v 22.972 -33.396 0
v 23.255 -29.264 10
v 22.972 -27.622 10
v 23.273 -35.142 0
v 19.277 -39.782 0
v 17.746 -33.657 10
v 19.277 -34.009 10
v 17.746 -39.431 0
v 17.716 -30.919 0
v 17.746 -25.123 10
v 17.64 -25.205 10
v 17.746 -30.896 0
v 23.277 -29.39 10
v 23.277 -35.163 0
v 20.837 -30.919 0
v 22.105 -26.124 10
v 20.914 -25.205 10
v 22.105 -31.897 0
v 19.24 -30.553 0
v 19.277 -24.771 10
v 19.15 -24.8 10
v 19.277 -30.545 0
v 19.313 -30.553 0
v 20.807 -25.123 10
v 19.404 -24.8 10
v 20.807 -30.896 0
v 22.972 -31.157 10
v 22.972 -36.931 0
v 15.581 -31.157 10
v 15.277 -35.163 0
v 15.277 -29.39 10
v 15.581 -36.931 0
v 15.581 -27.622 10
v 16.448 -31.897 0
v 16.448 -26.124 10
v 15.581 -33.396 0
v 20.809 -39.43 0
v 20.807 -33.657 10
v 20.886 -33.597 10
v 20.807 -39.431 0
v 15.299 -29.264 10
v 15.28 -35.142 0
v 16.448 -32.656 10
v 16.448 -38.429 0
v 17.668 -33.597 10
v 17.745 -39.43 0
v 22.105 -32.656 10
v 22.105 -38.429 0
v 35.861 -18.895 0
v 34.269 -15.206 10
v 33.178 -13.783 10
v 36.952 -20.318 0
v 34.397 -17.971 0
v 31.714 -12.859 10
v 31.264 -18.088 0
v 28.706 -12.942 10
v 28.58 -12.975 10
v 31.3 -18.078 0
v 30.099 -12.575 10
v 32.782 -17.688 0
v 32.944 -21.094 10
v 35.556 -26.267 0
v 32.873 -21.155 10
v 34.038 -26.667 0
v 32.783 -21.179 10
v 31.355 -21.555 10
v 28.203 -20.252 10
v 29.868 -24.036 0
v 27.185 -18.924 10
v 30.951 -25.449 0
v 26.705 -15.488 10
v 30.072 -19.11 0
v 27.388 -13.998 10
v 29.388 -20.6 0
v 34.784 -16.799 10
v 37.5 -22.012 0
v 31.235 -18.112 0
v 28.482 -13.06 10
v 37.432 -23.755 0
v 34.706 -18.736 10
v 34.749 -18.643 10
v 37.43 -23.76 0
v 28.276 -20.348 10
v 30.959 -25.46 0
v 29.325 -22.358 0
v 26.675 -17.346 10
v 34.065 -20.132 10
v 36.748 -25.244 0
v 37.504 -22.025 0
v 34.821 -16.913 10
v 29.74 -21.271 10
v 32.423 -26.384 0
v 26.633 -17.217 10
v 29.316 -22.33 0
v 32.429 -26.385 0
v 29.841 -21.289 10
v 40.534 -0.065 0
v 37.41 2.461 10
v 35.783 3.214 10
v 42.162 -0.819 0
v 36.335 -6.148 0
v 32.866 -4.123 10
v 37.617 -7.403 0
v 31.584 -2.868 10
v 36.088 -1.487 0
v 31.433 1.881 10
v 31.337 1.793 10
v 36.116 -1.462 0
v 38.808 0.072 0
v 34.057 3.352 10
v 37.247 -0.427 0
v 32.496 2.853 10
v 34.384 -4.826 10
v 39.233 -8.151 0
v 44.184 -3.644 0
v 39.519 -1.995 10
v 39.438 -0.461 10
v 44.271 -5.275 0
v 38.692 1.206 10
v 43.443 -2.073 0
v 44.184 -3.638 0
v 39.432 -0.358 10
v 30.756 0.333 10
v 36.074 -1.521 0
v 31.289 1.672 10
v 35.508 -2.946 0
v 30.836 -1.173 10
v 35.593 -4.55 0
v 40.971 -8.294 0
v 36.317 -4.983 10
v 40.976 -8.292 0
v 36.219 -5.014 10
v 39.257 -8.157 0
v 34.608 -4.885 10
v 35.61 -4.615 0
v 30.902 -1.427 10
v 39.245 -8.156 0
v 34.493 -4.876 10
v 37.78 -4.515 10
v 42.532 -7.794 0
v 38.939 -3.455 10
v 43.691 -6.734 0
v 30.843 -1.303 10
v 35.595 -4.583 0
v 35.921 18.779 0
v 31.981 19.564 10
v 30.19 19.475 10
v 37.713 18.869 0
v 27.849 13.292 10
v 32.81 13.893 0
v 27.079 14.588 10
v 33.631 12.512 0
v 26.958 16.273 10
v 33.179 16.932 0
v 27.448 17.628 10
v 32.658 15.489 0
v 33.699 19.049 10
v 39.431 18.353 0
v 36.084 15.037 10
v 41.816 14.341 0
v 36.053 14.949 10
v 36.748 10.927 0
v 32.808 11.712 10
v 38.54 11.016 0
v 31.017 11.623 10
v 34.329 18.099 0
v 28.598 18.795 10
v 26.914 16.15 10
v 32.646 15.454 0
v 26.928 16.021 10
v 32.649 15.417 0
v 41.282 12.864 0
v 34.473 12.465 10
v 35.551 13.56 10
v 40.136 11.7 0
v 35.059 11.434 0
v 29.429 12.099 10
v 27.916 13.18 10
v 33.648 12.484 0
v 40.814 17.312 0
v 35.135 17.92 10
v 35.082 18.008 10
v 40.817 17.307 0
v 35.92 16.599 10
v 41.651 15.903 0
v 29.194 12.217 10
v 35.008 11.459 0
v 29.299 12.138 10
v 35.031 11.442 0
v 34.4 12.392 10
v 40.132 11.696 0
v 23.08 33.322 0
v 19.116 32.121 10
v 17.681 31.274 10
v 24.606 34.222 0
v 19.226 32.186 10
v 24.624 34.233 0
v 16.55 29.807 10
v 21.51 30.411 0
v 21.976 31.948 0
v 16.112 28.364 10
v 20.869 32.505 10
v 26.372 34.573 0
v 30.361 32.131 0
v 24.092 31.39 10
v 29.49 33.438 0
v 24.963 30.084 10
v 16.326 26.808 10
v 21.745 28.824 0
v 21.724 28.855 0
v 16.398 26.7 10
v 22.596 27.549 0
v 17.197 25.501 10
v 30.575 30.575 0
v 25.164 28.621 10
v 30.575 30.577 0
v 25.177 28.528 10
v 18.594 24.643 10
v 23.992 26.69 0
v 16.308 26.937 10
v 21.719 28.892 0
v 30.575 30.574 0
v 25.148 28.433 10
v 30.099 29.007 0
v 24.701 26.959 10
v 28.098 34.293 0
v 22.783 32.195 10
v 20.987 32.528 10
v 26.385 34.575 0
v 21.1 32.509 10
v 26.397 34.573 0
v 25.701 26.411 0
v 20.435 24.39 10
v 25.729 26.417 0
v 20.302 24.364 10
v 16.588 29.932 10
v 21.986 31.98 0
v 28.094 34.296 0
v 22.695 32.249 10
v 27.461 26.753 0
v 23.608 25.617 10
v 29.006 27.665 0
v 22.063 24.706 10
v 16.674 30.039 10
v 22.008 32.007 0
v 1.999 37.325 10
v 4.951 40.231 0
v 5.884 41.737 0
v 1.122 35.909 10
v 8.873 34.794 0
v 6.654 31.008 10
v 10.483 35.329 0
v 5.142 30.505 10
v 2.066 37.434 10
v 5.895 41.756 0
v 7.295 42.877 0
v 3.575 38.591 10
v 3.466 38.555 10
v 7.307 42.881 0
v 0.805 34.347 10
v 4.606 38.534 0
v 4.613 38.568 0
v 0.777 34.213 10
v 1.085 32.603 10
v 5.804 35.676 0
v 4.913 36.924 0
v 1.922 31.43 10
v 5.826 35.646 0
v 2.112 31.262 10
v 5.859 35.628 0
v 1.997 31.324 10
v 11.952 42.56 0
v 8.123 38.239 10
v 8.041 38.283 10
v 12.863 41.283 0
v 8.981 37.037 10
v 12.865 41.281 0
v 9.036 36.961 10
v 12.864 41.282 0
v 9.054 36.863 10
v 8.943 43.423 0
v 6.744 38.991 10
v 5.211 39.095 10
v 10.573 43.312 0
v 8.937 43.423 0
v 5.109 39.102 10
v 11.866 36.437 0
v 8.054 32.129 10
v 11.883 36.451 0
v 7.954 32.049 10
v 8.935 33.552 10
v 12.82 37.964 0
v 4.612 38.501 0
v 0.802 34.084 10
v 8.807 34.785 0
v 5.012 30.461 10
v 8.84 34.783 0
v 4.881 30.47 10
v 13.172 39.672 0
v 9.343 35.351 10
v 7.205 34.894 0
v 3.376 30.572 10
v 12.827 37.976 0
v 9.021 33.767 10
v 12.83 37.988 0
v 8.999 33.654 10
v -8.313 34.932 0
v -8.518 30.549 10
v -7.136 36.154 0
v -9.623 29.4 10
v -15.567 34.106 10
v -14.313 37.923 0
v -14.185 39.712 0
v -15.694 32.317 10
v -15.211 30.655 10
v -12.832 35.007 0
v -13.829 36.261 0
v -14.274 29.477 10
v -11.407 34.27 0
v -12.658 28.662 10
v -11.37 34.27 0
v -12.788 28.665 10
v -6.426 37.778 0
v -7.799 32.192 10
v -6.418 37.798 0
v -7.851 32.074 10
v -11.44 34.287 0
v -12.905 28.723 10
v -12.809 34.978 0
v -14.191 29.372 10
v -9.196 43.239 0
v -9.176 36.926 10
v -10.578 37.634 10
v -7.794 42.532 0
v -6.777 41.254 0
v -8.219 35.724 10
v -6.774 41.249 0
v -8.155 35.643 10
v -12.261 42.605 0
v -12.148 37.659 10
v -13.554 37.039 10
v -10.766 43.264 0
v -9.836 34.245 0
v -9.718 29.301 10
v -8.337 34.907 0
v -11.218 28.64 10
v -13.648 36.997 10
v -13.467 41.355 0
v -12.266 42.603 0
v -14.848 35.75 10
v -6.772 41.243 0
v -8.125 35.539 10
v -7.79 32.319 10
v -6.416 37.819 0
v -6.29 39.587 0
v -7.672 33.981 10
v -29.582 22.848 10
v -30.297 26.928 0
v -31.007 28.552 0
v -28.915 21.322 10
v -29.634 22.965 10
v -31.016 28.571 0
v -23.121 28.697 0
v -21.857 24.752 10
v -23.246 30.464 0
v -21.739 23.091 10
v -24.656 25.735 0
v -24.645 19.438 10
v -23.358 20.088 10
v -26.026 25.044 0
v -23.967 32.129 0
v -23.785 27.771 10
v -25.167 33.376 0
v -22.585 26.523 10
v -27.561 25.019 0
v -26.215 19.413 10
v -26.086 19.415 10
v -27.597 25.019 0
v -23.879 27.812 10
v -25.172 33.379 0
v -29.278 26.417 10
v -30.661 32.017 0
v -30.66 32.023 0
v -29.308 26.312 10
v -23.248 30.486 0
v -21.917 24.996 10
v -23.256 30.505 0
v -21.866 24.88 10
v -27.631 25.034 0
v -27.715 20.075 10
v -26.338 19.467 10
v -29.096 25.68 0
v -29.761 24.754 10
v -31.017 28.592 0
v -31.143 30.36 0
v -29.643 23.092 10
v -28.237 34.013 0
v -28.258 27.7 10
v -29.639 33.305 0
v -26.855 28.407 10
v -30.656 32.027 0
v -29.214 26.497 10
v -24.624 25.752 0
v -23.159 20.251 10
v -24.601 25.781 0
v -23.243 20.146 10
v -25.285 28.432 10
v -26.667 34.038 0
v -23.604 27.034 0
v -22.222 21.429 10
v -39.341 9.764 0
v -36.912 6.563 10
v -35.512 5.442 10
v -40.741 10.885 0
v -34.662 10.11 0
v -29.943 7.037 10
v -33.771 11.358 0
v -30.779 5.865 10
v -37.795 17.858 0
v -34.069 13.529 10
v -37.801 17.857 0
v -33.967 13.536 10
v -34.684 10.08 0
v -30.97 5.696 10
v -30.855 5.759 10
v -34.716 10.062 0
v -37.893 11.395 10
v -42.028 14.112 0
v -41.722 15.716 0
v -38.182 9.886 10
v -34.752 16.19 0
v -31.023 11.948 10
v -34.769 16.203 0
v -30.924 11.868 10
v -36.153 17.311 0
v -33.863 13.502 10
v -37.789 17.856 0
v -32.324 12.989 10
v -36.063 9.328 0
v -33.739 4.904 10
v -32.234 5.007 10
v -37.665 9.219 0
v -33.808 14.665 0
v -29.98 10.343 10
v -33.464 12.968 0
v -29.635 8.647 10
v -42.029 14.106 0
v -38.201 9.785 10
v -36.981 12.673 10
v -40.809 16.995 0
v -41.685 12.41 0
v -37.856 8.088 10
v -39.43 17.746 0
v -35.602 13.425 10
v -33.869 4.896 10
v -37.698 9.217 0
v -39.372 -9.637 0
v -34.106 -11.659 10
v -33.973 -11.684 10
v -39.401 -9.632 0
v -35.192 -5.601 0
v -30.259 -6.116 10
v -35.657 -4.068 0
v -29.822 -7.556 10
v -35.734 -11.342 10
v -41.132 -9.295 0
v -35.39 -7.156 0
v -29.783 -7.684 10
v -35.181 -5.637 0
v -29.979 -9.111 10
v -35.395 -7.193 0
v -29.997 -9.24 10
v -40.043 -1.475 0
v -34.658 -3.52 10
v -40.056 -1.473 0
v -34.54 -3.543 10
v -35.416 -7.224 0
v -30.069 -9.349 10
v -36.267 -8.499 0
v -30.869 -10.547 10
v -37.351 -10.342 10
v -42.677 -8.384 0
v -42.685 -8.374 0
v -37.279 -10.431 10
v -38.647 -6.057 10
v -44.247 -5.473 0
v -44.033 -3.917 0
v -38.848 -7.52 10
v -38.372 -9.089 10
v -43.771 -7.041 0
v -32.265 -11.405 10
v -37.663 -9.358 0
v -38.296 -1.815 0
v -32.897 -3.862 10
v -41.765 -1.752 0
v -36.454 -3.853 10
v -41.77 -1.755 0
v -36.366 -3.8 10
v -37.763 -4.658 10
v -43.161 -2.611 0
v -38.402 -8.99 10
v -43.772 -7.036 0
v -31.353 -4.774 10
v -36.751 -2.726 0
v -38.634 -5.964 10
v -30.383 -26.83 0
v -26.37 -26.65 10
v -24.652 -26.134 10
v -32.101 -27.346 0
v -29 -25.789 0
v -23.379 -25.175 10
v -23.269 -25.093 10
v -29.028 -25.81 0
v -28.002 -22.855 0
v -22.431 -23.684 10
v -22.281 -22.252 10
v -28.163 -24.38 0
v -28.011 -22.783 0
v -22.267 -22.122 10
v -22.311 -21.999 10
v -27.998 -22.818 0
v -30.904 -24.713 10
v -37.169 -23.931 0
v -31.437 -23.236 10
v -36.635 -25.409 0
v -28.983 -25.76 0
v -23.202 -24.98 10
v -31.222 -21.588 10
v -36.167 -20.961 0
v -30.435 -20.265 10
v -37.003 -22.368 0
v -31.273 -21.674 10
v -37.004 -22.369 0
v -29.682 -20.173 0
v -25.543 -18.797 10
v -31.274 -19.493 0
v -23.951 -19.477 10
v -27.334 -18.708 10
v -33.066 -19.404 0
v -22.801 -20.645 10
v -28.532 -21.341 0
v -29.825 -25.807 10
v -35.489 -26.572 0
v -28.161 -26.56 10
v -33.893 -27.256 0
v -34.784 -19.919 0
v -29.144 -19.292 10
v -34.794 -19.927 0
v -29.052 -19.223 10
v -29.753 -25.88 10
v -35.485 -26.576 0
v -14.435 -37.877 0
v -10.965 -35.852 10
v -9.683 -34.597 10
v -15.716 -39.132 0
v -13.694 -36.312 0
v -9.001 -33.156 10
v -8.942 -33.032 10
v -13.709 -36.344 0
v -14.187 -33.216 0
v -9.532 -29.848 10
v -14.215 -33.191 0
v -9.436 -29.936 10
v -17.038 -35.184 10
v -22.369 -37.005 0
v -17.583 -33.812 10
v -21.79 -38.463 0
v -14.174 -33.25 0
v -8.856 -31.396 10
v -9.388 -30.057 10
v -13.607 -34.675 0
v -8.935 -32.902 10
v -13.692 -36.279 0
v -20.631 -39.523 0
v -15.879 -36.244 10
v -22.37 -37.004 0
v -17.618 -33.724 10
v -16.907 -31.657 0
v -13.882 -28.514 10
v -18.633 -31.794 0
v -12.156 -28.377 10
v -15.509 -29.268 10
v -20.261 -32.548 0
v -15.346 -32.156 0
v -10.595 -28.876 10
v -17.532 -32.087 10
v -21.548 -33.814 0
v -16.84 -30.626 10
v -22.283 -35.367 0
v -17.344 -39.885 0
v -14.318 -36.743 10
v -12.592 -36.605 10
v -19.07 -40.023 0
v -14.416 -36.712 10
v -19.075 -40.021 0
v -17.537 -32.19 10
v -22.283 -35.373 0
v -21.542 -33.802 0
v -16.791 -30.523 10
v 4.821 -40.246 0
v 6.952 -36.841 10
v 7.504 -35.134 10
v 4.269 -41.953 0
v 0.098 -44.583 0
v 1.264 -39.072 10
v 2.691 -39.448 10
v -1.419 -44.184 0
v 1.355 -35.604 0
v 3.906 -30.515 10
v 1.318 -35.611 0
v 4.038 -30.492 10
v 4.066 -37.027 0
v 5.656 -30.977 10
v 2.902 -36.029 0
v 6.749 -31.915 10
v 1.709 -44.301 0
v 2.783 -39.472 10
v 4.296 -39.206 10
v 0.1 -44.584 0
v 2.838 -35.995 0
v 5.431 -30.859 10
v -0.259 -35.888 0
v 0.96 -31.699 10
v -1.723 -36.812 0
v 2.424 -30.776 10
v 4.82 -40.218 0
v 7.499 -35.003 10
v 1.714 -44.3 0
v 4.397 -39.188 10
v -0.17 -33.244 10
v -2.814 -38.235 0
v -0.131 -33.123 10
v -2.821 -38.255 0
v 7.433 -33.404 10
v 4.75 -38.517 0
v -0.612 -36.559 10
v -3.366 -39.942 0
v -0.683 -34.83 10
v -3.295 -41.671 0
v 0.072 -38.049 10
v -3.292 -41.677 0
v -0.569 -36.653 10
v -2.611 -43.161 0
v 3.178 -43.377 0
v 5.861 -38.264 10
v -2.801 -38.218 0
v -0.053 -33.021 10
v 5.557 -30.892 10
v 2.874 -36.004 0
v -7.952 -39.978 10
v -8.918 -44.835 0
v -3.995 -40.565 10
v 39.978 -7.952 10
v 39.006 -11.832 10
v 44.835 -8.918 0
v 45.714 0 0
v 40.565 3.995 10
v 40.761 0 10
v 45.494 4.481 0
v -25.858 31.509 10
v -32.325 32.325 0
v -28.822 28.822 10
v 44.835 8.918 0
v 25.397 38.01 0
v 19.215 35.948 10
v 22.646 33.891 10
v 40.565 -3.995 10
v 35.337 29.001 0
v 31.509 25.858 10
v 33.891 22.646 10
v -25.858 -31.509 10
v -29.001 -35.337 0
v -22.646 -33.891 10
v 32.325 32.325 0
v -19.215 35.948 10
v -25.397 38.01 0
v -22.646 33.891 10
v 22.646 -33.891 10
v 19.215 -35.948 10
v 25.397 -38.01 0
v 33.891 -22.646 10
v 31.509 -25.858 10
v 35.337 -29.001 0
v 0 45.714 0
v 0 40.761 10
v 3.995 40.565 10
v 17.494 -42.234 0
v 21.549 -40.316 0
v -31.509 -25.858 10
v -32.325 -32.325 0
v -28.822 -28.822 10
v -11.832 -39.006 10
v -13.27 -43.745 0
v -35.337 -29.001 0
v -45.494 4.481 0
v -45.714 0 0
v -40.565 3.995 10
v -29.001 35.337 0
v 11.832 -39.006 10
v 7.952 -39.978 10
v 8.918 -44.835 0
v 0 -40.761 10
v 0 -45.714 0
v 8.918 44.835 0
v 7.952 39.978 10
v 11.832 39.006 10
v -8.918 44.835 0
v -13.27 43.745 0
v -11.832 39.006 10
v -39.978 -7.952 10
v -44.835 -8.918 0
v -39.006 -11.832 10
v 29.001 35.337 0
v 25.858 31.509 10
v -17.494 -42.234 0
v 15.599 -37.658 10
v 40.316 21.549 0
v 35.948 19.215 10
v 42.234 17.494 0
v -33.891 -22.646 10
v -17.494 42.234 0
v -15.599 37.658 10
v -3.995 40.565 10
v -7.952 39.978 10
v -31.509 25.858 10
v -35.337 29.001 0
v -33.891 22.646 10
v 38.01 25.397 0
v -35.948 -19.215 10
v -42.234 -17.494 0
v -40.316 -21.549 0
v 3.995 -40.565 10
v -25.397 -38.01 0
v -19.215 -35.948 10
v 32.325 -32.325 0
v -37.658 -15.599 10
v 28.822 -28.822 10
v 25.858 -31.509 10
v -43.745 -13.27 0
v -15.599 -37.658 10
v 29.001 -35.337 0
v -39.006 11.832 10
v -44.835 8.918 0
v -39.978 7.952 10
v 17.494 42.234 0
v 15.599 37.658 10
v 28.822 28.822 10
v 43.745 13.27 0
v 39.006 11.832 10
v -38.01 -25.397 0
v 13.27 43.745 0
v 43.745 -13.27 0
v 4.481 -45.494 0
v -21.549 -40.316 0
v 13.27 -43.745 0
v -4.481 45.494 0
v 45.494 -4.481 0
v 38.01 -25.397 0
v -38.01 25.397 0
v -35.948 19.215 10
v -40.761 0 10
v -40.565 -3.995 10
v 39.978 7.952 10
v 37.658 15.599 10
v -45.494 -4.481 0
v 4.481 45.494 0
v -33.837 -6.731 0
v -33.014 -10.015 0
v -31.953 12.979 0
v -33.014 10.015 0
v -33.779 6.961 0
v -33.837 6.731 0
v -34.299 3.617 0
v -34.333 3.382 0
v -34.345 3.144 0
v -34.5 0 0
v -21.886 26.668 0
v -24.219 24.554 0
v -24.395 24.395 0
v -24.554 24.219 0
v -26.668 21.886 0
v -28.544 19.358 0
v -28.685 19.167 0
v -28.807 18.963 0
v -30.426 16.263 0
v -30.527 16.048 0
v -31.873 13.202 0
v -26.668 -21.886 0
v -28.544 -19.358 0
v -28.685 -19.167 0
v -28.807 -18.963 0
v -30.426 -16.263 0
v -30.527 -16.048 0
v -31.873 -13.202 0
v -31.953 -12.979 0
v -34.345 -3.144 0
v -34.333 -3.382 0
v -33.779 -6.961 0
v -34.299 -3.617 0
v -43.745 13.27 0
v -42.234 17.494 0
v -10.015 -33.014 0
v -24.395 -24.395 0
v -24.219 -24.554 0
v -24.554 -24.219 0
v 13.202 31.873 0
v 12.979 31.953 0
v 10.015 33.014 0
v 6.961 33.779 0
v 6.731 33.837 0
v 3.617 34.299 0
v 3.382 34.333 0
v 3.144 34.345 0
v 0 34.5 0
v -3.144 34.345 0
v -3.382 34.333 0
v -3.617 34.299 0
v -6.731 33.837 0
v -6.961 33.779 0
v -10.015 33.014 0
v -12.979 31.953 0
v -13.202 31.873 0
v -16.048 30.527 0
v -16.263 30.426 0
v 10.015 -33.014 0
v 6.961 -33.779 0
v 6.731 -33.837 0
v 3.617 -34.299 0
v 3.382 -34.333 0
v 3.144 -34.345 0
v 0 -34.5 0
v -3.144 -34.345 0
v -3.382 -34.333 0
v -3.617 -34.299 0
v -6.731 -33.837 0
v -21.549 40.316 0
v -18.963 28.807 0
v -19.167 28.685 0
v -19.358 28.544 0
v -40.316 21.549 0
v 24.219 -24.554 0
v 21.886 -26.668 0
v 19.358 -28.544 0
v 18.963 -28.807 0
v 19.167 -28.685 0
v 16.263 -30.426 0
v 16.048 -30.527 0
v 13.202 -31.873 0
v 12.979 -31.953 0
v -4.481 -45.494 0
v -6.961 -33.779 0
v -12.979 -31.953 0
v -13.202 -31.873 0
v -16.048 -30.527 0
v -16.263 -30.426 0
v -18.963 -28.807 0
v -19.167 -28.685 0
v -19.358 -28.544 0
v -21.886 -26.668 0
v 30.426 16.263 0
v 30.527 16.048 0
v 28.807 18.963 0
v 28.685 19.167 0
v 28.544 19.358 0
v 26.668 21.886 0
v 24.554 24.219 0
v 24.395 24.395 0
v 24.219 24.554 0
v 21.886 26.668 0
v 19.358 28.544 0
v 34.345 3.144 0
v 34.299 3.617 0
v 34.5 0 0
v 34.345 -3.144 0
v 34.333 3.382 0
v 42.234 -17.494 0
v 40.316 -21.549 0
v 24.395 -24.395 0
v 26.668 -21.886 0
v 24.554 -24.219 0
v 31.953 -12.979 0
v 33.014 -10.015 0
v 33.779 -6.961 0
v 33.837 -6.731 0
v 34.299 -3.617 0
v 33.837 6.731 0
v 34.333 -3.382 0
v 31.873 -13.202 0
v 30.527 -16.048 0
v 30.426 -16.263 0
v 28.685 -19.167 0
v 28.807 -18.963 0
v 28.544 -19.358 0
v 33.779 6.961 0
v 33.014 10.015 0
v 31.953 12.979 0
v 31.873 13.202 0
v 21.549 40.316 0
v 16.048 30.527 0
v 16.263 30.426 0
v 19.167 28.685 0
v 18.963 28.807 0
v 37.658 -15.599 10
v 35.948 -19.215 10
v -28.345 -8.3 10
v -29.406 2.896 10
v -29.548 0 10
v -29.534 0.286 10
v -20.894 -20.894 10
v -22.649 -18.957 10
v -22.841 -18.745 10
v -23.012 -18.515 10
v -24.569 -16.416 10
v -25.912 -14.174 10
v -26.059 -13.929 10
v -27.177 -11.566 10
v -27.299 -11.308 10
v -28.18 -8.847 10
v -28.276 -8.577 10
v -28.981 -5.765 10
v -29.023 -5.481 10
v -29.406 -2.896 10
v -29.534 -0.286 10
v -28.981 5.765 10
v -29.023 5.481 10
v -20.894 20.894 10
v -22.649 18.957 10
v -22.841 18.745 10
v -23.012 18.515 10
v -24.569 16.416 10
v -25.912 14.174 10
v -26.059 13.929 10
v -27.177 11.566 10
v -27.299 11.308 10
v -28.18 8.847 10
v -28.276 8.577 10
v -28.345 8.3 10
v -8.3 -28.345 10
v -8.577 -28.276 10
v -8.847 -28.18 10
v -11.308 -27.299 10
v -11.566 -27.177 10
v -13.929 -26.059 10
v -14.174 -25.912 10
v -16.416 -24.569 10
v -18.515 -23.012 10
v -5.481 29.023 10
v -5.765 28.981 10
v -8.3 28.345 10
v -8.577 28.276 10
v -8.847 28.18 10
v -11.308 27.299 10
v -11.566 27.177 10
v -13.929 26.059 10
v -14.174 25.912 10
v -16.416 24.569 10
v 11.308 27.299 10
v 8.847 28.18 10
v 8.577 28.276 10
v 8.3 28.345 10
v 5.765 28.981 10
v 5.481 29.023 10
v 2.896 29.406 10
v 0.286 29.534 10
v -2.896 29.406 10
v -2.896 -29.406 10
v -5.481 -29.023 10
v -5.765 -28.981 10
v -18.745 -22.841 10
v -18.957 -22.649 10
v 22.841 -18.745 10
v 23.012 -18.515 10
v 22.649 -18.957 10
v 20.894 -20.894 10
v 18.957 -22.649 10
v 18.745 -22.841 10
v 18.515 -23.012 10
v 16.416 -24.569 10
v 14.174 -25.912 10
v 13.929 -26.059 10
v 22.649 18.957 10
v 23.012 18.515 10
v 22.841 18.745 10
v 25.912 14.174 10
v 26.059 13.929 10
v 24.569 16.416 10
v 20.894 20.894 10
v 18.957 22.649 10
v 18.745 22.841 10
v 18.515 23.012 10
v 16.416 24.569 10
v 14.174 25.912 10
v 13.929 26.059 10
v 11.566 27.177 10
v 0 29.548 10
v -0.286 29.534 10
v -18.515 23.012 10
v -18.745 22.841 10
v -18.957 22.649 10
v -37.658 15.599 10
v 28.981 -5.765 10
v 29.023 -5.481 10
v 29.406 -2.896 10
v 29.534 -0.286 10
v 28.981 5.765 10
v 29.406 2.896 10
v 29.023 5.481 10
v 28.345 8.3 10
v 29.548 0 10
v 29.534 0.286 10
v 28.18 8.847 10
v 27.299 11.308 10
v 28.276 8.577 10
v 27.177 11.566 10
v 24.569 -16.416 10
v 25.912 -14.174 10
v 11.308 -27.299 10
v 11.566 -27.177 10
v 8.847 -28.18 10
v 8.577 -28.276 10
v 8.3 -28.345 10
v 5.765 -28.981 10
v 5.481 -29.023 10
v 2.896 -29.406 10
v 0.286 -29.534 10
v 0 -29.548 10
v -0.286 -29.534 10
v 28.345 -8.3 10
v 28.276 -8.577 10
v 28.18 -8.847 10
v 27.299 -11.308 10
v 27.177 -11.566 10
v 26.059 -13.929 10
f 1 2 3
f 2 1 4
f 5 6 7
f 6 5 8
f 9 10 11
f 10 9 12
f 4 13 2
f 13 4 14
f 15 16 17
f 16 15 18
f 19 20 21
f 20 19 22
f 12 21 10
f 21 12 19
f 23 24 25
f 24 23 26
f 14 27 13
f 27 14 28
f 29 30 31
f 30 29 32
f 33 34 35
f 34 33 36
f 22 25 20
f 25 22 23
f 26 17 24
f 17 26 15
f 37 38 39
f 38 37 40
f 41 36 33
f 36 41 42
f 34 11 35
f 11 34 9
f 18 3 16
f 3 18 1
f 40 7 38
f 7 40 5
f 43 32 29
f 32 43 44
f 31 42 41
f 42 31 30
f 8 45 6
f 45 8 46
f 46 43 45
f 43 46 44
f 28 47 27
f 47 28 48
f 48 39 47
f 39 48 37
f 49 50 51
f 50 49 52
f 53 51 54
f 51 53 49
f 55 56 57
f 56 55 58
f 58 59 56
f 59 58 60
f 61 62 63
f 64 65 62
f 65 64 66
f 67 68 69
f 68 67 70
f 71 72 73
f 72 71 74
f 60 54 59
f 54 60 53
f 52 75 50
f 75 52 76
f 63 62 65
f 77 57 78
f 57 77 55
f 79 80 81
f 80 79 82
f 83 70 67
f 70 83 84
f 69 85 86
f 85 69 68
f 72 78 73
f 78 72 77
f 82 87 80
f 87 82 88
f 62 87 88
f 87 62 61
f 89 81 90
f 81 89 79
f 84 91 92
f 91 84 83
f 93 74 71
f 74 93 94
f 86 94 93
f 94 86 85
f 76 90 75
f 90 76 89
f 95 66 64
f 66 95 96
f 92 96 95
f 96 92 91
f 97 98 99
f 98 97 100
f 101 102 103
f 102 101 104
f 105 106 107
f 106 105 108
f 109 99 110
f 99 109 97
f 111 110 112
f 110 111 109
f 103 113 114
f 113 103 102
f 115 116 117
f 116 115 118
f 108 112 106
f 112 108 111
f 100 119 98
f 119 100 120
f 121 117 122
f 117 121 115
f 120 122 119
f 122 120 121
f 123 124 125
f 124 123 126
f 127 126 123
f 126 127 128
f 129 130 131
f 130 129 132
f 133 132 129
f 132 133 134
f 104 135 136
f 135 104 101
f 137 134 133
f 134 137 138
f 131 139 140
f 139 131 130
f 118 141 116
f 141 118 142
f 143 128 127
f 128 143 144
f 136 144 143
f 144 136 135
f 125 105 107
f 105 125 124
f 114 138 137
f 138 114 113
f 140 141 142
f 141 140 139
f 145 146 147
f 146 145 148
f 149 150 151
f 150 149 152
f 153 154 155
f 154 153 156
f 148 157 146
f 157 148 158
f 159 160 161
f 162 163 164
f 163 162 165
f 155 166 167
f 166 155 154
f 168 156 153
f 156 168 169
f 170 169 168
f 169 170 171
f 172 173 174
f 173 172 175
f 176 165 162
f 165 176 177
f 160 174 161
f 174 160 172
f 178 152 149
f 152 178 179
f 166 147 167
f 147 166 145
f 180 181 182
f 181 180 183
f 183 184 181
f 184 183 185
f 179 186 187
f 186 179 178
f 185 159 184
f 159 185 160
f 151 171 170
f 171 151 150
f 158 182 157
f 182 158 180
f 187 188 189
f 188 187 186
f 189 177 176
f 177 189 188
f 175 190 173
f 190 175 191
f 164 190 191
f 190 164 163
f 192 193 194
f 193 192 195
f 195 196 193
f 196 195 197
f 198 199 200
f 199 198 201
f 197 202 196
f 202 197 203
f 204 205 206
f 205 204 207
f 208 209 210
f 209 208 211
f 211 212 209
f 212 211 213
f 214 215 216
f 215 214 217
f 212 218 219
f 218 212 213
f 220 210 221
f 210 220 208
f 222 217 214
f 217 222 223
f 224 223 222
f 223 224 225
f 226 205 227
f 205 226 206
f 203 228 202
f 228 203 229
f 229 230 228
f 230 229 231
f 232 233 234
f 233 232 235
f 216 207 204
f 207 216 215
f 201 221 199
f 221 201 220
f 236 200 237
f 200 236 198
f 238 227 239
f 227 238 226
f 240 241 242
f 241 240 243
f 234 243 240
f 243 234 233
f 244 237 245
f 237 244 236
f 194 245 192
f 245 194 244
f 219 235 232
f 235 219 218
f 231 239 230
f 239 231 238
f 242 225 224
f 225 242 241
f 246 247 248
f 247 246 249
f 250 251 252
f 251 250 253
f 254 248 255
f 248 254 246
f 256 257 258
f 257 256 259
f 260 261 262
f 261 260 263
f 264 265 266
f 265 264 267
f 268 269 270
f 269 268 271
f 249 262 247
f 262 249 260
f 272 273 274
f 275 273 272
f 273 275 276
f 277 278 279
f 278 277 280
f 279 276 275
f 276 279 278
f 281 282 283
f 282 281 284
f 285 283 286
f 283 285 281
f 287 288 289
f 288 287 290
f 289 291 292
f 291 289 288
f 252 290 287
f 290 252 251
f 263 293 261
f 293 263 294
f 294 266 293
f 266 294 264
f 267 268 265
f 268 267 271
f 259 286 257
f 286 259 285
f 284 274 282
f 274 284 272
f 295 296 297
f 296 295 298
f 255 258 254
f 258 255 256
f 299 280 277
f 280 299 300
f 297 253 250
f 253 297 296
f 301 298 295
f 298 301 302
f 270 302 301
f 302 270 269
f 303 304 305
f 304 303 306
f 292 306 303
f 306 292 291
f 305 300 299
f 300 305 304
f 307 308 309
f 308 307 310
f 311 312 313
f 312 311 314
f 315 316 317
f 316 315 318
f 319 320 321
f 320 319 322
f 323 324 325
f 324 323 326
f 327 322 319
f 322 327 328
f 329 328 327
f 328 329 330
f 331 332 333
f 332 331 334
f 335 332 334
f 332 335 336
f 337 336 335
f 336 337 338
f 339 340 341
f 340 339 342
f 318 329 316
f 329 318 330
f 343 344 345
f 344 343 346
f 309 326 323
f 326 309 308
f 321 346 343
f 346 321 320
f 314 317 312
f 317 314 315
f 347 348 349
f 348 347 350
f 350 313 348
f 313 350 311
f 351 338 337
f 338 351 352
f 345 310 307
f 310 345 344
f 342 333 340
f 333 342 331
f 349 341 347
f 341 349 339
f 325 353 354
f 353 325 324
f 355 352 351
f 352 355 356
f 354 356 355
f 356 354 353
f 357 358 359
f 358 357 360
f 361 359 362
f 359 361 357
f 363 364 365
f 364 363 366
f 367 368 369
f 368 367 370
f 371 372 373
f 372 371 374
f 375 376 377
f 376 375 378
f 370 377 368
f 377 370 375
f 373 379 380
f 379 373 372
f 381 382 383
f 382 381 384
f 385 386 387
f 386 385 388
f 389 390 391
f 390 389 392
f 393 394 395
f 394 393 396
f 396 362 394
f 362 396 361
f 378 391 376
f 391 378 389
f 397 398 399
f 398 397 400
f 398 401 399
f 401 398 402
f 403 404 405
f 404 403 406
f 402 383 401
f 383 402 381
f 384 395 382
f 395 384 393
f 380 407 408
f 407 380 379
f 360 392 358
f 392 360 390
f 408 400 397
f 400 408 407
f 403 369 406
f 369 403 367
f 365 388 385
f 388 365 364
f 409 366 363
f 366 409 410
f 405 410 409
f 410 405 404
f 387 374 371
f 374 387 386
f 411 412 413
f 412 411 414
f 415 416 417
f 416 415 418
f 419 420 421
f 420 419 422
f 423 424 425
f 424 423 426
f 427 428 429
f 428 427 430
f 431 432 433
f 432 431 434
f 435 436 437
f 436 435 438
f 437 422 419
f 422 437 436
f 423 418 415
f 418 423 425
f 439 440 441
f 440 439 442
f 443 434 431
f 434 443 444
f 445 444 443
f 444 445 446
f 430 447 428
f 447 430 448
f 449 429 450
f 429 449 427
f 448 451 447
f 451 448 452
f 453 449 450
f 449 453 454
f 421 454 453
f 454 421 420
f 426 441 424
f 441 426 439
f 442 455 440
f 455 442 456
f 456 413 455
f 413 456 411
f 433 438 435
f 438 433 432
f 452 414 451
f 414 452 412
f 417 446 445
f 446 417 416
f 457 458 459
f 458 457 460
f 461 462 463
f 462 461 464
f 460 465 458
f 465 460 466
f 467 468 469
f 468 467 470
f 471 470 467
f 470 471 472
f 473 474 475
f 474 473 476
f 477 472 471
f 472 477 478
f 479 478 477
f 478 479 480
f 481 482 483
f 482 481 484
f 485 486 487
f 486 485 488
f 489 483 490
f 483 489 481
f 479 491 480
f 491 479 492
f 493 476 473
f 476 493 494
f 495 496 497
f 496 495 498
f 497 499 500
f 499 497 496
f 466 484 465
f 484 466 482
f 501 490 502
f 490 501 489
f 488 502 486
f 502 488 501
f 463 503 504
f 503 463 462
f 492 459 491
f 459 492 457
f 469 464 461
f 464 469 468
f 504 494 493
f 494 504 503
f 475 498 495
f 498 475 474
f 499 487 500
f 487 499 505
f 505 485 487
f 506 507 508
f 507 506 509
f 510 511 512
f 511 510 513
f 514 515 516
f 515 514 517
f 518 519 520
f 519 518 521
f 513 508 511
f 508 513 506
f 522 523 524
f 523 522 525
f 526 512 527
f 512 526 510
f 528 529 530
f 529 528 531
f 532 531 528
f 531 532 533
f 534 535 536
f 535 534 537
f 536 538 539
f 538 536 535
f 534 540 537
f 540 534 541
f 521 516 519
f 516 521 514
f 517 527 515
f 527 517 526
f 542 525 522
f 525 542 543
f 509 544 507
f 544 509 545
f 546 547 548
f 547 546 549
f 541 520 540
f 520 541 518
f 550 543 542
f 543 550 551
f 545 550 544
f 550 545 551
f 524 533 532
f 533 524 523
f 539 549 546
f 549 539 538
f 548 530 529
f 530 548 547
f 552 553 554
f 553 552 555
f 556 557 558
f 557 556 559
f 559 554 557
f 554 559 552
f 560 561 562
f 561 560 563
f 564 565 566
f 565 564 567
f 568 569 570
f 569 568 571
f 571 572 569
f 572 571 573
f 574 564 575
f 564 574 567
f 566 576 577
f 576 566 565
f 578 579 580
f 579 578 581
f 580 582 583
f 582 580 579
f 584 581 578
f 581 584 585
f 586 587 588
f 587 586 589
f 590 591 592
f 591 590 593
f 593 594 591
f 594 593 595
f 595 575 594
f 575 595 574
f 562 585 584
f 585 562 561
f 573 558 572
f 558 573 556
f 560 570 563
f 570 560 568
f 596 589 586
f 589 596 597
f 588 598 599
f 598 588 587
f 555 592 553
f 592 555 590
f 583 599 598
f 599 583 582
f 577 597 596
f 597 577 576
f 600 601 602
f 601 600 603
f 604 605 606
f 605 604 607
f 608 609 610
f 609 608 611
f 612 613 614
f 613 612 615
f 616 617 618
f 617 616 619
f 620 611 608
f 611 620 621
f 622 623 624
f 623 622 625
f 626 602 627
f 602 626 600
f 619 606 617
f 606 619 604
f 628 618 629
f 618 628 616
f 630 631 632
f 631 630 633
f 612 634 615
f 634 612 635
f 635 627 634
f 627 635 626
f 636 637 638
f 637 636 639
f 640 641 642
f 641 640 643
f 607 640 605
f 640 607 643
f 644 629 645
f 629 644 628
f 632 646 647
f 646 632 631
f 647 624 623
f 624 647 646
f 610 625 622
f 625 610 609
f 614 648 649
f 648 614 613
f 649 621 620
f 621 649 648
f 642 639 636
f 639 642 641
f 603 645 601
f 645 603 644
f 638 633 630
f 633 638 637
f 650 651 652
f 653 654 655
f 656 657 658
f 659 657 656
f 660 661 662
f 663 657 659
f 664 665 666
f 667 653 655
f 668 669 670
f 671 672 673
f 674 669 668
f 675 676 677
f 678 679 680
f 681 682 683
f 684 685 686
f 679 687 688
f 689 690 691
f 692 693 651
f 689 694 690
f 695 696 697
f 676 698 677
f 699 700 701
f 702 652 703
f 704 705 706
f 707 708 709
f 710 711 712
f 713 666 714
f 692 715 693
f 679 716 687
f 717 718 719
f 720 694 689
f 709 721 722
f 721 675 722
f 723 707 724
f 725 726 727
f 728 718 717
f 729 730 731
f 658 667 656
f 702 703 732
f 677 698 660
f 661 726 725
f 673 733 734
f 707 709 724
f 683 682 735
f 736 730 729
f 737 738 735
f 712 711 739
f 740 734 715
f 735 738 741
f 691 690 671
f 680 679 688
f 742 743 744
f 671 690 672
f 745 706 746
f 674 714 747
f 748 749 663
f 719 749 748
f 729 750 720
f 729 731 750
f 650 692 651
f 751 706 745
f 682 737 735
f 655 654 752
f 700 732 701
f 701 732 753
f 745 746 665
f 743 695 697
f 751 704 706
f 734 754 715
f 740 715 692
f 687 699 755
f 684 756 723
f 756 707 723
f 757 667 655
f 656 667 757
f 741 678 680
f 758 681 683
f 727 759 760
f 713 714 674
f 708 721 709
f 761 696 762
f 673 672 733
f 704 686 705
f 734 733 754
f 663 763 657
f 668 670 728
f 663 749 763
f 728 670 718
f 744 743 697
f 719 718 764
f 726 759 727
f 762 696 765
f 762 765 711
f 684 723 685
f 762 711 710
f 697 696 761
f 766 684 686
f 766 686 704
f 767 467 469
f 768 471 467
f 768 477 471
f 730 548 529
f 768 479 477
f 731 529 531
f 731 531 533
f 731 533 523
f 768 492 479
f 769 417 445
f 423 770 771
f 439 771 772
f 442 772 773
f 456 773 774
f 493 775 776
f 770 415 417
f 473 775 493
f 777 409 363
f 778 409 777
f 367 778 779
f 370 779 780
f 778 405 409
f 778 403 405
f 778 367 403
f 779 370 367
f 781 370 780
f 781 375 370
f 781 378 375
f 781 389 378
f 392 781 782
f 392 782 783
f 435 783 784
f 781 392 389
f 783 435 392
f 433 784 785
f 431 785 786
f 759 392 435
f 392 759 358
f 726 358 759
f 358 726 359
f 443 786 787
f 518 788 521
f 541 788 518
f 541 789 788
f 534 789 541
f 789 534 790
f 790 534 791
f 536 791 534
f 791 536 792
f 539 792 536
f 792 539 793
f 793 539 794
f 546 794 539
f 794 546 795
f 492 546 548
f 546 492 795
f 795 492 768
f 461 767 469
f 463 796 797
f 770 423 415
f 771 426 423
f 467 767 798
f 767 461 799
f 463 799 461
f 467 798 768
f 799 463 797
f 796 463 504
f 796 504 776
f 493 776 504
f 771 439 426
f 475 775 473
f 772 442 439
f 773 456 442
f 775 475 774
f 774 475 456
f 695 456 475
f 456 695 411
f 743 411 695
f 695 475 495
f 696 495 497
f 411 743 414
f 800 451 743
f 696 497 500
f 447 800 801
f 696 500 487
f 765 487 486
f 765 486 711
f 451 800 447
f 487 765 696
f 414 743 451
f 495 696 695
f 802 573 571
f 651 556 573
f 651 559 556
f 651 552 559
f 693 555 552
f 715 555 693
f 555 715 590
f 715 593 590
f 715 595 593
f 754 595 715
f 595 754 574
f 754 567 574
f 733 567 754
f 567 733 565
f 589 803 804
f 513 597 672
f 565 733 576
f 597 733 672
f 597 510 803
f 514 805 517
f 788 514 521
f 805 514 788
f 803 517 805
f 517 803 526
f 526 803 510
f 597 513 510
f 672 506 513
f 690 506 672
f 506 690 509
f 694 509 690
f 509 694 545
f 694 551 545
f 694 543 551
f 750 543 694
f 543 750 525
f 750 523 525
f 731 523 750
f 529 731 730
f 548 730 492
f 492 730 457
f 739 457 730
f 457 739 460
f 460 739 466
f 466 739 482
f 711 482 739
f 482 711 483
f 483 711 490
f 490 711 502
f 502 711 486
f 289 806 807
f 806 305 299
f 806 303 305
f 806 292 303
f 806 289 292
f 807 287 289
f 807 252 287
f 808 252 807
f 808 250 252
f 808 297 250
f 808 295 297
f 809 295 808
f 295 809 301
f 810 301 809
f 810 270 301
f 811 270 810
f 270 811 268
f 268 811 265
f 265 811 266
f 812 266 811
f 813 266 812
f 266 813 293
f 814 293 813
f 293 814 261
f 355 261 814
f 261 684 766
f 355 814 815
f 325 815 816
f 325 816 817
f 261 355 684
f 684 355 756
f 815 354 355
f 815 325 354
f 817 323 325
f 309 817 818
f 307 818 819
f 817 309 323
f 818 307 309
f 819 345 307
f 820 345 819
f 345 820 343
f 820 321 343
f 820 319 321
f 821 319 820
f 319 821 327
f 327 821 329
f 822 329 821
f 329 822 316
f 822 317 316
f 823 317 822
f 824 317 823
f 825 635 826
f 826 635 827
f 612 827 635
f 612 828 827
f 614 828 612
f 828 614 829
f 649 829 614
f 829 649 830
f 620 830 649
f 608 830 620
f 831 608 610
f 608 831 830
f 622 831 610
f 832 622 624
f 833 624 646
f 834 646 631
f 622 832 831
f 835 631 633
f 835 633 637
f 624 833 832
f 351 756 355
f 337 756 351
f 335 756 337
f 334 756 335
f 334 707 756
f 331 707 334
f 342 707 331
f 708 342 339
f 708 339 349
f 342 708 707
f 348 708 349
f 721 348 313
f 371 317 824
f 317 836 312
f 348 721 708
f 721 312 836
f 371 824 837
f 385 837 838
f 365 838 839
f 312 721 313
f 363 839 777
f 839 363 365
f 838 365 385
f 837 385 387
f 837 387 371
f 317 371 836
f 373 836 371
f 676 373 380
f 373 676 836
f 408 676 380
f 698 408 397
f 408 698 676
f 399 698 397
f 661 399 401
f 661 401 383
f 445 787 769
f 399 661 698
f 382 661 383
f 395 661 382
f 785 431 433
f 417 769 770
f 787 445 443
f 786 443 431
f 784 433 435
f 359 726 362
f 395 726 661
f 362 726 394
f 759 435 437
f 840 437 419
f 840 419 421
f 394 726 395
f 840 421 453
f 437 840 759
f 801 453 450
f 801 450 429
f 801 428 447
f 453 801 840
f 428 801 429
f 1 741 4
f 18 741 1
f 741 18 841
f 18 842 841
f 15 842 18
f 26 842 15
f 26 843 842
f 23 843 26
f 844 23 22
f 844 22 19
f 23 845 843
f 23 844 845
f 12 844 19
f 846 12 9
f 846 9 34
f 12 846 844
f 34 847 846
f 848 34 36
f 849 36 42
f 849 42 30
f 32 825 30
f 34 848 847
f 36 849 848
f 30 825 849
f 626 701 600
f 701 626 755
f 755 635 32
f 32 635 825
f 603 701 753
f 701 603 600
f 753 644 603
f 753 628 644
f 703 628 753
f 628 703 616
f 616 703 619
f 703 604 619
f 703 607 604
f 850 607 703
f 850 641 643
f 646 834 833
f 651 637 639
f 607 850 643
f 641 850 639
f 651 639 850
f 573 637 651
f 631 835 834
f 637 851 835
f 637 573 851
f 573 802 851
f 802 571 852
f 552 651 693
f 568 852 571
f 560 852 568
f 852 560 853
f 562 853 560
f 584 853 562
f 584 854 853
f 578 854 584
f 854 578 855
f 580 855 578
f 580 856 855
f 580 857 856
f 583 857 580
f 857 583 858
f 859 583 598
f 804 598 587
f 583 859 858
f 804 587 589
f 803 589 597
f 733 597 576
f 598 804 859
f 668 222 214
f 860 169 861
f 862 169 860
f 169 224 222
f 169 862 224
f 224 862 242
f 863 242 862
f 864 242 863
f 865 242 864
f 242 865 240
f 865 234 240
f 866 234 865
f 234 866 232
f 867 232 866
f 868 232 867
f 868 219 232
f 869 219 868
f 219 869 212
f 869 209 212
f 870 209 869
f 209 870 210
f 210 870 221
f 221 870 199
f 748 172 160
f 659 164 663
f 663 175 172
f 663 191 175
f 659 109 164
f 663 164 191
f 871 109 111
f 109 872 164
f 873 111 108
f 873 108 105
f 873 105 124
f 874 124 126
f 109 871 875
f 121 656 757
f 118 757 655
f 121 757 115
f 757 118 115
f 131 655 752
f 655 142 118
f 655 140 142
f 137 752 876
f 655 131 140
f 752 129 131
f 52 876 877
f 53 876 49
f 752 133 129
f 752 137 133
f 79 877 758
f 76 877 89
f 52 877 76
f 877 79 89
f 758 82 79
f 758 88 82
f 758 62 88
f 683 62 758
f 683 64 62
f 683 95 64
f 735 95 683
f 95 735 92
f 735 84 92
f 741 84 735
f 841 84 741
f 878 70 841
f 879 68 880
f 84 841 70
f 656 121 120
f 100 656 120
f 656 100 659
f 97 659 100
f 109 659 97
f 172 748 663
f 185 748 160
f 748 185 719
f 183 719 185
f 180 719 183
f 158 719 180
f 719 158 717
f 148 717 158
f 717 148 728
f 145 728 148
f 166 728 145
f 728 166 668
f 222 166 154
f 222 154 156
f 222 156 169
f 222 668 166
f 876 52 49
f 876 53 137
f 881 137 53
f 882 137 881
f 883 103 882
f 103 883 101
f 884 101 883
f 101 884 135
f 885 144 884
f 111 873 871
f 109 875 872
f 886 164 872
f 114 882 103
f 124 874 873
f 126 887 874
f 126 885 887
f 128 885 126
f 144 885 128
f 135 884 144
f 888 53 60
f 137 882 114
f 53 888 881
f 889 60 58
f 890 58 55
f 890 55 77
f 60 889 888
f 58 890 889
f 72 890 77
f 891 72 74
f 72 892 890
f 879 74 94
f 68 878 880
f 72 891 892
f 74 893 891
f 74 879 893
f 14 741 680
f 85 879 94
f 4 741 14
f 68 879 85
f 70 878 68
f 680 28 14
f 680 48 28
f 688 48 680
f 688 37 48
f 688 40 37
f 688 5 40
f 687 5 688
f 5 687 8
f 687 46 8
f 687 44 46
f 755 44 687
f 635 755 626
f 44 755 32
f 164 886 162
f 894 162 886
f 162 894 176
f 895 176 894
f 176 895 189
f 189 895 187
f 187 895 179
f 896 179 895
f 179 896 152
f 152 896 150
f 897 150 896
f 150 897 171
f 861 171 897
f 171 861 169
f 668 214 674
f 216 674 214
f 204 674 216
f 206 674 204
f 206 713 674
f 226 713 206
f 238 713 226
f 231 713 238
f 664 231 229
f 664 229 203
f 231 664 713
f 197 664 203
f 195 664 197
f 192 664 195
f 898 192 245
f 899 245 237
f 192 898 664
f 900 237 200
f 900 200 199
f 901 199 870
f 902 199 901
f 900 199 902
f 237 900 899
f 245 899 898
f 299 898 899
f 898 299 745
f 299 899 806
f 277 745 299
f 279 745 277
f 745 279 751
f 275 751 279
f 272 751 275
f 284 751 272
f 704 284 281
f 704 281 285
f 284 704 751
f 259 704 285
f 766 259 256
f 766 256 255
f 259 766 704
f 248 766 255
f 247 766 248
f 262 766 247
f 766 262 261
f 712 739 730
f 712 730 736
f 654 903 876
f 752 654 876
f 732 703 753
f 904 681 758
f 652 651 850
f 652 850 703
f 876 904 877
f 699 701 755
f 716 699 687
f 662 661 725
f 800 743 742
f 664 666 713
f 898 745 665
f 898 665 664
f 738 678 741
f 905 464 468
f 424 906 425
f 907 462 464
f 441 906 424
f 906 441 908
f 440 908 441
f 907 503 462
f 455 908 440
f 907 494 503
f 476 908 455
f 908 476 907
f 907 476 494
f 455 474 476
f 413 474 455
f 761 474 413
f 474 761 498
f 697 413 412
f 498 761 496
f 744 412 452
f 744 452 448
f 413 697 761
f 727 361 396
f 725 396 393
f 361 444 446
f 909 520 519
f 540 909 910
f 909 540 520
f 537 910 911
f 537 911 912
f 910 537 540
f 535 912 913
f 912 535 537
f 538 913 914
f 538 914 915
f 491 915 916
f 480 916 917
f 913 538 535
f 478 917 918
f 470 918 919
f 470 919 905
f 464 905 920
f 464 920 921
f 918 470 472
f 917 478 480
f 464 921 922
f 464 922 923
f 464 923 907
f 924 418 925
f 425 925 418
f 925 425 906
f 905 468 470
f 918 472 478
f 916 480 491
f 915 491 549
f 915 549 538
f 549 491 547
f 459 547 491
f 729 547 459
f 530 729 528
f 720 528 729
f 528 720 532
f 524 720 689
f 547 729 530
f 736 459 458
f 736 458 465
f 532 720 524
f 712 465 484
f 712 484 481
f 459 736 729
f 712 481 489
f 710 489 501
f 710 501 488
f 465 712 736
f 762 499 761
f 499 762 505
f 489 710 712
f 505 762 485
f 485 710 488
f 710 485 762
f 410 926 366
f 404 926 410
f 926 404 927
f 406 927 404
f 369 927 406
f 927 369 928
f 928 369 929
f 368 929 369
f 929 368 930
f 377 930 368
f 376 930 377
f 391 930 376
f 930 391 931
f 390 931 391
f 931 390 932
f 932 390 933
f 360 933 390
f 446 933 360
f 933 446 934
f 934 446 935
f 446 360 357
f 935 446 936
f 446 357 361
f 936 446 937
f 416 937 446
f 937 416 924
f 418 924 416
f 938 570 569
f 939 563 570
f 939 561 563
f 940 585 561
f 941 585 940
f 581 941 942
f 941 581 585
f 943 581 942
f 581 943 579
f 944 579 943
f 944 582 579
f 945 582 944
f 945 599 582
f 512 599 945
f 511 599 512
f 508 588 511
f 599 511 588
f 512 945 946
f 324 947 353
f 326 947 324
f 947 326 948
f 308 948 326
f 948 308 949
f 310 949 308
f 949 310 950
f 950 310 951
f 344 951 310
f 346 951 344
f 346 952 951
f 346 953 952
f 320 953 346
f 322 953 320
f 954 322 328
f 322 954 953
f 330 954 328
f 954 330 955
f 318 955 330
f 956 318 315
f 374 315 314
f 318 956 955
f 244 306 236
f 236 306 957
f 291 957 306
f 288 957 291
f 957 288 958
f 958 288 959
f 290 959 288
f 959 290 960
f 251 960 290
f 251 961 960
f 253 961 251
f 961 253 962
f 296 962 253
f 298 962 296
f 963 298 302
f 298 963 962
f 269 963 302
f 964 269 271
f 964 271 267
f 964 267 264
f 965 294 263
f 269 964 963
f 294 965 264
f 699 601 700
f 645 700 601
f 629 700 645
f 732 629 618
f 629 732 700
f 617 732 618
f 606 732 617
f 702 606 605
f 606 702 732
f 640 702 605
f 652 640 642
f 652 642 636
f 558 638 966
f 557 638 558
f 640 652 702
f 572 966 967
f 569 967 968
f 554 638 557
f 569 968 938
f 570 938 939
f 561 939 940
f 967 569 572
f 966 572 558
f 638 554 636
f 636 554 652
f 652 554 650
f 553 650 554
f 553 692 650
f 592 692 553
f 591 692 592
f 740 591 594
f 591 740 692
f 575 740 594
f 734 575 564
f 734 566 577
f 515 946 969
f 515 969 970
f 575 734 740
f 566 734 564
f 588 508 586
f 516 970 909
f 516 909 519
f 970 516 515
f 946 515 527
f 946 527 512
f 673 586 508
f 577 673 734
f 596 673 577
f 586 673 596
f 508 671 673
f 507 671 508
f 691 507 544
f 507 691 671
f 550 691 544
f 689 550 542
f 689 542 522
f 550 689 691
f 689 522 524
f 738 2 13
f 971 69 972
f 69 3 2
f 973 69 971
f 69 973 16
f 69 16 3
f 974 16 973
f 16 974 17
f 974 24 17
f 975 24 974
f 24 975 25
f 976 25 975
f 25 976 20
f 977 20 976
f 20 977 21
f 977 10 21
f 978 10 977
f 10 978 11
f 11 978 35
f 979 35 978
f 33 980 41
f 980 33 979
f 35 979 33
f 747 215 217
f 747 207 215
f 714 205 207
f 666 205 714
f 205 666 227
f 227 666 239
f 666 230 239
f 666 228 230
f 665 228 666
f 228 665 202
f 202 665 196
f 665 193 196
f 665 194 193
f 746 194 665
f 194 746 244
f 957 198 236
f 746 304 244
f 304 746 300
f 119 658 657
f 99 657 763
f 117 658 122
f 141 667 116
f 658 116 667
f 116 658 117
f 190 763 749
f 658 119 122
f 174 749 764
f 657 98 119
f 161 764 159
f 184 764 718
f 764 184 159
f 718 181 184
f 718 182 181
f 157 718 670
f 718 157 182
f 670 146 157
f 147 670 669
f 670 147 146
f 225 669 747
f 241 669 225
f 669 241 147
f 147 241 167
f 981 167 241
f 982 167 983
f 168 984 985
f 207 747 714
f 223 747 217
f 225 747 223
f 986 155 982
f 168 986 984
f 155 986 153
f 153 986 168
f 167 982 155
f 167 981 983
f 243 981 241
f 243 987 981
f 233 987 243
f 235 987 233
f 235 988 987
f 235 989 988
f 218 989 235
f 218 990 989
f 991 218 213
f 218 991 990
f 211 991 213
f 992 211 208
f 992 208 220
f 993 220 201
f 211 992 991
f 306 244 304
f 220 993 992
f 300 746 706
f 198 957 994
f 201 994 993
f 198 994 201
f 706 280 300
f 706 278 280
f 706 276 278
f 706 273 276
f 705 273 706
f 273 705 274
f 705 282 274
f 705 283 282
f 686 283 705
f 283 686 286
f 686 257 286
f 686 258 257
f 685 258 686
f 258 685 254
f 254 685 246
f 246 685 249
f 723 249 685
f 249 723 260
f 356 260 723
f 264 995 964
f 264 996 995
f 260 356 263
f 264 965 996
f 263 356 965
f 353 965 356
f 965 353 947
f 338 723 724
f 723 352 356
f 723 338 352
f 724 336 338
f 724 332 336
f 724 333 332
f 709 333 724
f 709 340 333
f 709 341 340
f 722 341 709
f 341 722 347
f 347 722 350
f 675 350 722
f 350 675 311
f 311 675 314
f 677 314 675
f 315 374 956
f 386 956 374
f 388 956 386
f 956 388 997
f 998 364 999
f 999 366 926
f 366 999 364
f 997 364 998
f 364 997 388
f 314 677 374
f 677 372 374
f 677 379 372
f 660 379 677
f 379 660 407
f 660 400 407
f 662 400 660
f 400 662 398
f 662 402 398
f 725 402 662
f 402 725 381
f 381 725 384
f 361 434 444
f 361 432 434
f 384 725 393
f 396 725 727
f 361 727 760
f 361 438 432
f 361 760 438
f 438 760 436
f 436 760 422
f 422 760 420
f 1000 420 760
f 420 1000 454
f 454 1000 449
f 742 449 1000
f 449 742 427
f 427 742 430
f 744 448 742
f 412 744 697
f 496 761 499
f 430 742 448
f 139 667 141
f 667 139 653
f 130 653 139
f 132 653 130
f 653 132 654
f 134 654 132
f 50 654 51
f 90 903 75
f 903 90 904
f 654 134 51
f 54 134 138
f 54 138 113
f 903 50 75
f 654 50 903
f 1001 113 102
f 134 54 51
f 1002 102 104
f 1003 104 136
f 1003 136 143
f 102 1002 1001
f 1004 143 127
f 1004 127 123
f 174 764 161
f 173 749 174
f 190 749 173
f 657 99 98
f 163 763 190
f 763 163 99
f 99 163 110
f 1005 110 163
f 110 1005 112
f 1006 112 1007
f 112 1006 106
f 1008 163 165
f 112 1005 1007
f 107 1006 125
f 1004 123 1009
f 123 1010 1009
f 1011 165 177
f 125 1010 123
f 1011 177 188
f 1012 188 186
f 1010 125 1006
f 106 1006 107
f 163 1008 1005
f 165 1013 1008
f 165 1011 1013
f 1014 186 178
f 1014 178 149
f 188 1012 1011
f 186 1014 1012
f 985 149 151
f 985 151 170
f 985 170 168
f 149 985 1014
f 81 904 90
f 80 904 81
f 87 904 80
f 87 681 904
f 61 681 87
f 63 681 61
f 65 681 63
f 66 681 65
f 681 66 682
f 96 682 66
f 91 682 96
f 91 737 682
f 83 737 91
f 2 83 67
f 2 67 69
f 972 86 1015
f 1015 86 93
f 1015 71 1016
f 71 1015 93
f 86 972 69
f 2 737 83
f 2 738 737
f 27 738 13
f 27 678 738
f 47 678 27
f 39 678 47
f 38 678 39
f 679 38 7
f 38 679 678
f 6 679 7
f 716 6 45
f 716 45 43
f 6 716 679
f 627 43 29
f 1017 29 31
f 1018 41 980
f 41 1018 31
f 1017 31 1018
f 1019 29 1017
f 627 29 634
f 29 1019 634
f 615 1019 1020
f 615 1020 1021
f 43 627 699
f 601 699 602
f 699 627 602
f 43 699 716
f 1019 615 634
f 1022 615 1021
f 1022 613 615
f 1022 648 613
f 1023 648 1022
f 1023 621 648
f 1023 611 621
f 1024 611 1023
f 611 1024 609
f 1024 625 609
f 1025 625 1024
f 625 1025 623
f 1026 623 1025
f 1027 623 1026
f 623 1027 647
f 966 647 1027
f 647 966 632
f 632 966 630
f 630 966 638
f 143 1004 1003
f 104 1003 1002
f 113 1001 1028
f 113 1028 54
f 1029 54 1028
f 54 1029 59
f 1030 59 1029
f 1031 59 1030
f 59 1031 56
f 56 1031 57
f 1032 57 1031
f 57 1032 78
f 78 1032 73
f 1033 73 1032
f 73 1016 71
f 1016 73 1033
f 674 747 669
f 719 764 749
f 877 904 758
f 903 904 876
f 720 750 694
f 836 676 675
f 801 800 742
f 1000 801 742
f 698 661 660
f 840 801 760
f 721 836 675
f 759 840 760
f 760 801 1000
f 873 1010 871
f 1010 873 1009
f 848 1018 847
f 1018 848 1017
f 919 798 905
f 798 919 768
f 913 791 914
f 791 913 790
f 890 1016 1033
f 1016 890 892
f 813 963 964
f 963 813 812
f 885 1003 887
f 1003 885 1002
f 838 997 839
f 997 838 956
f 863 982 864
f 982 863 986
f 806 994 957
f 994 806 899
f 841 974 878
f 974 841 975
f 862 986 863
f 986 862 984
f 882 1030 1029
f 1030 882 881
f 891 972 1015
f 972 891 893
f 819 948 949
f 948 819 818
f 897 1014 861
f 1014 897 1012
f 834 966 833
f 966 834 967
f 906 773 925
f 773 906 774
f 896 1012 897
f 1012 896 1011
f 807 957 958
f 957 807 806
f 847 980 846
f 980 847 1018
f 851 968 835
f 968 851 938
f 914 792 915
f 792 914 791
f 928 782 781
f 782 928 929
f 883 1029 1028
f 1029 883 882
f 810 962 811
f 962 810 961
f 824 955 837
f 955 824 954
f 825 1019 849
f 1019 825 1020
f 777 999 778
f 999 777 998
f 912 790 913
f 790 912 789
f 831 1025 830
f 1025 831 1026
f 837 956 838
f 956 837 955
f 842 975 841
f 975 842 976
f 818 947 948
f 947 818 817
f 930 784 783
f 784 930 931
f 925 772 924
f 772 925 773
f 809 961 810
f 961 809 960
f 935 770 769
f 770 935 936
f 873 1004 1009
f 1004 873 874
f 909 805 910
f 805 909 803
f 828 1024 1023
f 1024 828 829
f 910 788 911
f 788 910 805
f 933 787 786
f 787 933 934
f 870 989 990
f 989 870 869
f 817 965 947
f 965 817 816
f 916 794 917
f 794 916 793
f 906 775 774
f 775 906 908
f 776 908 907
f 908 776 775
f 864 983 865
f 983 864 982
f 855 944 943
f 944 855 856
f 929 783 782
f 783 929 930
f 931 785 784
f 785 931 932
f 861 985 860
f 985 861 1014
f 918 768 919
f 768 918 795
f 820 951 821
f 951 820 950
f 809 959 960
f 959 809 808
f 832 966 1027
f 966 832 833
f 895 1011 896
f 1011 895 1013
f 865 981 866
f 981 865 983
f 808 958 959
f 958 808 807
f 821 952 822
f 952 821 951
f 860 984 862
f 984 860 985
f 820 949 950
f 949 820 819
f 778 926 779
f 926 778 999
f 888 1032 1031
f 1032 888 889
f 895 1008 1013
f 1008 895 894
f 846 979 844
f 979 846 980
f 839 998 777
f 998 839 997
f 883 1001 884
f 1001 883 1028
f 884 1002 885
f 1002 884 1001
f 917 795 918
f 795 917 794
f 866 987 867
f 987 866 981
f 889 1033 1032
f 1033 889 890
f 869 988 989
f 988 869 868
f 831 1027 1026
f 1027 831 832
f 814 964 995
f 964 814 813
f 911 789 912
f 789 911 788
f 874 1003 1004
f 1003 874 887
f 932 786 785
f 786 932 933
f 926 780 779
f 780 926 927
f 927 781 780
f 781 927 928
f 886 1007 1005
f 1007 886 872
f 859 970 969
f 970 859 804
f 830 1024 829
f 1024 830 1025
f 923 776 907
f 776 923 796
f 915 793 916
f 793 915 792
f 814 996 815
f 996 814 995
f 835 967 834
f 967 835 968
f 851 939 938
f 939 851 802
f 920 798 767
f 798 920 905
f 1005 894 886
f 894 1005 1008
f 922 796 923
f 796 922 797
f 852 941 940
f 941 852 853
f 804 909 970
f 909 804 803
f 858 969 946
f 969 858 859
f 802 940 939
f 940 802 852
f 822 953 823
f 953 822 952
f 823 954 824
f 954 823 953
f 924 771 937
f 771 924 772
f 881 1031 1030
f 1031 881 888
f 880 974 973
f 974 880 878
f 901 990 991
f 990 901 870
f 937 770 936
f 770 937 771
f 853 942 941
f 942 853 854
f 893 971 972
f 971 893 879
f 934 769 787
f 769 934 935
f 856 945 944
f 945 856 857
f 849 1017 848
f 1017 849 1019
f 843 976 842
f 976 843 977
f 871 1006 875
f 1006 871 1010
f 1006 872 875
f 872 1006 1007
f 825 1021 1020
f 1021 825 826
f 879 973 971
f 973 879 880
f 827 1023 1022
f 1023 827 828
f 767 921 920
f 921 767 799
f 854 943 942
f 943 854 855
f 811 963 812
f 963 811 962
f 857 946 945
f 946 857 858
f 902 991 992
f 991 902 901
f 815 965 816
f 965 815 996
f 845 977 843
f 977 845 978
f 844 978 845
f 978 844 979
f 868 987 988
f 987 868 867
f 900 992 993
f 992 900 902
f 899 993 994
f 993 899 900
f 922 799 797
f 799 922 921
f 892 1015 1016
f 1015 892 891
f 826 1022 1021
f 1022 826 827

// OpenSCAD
// file: hyperbolic_pencil_holder.scad
// author: clayb.rpi@gmail.com
// date: 2013-11-24
// units: mm
//
// description: a ring to hold a bunch of pencils at an angle
// so the lean on each other.
//
// derived from: http://www.thingiverse.com/thing:8433

//-------------
// User input 
//-------------

// The number of pencils the stand should hold.
NUM_PENCILS = 13;

// The diameter of each pencil
PENCIL_DIAMETER = 8;

// The length of each pencil
PENCIL_LENGTH = 190;

// The angle the pencils should stand at
LEAN_ANGLE = 30;

// The height of the base
BASE_HEIGHT = 10;

// The width of walls around the base.
WALL_WIDTH = 1;

// Shift the intersetion point from the center of the pencils.
PENCIL_SHIFT = 30;

/* [Hidden] */
$fn = 64;


//--------------------------
// Calculated values.
//--------------------------
leanAngle = min(80, max(-80, LEAN_ANGLE));
numPencils = max(2, NUM_PENCILS);
baseHeight = max(0, BASE_HEIGHT);
wallWidth = max(0, WALL_WIDTH);

rodRadius = max(0, PENCIL_DIAMETER) / 2;
rodCutLength = max(BASE_HEIGHT, PENCIL_LENGTH) + 2 * rodRadius * tan(leanAngle);
rodLength = rodCutLength / 2 - PENCIL_SHIFT;

// An offset from the center of the pencils (where they are closet) to their bottoms.
bottom = sin(leanAngle) * rodRadius - cos(leanAngle) * rodLength;

// An approximation of how wide the pencils are when leaning.
a = rodRadius / cos(leanAngle);
b = rodRadius;
theta = 90 / numPencils;

// average of the elliptical angle and the maximal radii to account overlap.
effectiveRodRadius = ((a * b) / sqrt(pow(b * cos(theta), 2) + pow(a * sin(theta), 2)) + a) / 2;

function xRodOffset(h) = effectiveRodRadius / sin(360 / (2 * numPencils));
function yRodOffset(h) = (h - effectiveRodRadius) / tan(90 - leanAngle);
function zRodRadius(h) = sqrt(pow(xRodOffset(h), 2) + pow(yRodOffset(h), 2));

// Debugging output.
echo("base outer diameter", 2 * (zRodRadius(bottom) + effectiveRodRadius + wallWidth));

difference() {
  // the actual base.
  cylinder(r1=zRodRadius(bottom) + effectiveRodRadius + wallWidth,
           r2=zRodRadius(bottom + baseHeight) + effectiveRodRadius + wallWidth,
           h=baseHeight);

  // cut out a hole in the center.
  translate([0, 0, -1])
  cylinder(r1=zRodRadius(bottom - 1) - effectiveRodRadius - wallWidth,
           r2=zRodRadius(bottom + baseHeight + 1) - effectiveRodRadius - wallWidth,
           h=baseHeight + 2);

  #
  // cut out the pencils.
  for (i = [0 : numPencils- 1 ]) {
    rotate([0, 0, i * 360 / numPencils])
    translate([xRodOffset(bottom), yRodOffset(bottom), 0])
    rotate([-leanAngle, 0, 0])
    translate([0, 0, -rodRadius * tan(leanAngle)])
    cylinder(r=rodRadius, h=rodCutLength, $fn=16);
  }
}
